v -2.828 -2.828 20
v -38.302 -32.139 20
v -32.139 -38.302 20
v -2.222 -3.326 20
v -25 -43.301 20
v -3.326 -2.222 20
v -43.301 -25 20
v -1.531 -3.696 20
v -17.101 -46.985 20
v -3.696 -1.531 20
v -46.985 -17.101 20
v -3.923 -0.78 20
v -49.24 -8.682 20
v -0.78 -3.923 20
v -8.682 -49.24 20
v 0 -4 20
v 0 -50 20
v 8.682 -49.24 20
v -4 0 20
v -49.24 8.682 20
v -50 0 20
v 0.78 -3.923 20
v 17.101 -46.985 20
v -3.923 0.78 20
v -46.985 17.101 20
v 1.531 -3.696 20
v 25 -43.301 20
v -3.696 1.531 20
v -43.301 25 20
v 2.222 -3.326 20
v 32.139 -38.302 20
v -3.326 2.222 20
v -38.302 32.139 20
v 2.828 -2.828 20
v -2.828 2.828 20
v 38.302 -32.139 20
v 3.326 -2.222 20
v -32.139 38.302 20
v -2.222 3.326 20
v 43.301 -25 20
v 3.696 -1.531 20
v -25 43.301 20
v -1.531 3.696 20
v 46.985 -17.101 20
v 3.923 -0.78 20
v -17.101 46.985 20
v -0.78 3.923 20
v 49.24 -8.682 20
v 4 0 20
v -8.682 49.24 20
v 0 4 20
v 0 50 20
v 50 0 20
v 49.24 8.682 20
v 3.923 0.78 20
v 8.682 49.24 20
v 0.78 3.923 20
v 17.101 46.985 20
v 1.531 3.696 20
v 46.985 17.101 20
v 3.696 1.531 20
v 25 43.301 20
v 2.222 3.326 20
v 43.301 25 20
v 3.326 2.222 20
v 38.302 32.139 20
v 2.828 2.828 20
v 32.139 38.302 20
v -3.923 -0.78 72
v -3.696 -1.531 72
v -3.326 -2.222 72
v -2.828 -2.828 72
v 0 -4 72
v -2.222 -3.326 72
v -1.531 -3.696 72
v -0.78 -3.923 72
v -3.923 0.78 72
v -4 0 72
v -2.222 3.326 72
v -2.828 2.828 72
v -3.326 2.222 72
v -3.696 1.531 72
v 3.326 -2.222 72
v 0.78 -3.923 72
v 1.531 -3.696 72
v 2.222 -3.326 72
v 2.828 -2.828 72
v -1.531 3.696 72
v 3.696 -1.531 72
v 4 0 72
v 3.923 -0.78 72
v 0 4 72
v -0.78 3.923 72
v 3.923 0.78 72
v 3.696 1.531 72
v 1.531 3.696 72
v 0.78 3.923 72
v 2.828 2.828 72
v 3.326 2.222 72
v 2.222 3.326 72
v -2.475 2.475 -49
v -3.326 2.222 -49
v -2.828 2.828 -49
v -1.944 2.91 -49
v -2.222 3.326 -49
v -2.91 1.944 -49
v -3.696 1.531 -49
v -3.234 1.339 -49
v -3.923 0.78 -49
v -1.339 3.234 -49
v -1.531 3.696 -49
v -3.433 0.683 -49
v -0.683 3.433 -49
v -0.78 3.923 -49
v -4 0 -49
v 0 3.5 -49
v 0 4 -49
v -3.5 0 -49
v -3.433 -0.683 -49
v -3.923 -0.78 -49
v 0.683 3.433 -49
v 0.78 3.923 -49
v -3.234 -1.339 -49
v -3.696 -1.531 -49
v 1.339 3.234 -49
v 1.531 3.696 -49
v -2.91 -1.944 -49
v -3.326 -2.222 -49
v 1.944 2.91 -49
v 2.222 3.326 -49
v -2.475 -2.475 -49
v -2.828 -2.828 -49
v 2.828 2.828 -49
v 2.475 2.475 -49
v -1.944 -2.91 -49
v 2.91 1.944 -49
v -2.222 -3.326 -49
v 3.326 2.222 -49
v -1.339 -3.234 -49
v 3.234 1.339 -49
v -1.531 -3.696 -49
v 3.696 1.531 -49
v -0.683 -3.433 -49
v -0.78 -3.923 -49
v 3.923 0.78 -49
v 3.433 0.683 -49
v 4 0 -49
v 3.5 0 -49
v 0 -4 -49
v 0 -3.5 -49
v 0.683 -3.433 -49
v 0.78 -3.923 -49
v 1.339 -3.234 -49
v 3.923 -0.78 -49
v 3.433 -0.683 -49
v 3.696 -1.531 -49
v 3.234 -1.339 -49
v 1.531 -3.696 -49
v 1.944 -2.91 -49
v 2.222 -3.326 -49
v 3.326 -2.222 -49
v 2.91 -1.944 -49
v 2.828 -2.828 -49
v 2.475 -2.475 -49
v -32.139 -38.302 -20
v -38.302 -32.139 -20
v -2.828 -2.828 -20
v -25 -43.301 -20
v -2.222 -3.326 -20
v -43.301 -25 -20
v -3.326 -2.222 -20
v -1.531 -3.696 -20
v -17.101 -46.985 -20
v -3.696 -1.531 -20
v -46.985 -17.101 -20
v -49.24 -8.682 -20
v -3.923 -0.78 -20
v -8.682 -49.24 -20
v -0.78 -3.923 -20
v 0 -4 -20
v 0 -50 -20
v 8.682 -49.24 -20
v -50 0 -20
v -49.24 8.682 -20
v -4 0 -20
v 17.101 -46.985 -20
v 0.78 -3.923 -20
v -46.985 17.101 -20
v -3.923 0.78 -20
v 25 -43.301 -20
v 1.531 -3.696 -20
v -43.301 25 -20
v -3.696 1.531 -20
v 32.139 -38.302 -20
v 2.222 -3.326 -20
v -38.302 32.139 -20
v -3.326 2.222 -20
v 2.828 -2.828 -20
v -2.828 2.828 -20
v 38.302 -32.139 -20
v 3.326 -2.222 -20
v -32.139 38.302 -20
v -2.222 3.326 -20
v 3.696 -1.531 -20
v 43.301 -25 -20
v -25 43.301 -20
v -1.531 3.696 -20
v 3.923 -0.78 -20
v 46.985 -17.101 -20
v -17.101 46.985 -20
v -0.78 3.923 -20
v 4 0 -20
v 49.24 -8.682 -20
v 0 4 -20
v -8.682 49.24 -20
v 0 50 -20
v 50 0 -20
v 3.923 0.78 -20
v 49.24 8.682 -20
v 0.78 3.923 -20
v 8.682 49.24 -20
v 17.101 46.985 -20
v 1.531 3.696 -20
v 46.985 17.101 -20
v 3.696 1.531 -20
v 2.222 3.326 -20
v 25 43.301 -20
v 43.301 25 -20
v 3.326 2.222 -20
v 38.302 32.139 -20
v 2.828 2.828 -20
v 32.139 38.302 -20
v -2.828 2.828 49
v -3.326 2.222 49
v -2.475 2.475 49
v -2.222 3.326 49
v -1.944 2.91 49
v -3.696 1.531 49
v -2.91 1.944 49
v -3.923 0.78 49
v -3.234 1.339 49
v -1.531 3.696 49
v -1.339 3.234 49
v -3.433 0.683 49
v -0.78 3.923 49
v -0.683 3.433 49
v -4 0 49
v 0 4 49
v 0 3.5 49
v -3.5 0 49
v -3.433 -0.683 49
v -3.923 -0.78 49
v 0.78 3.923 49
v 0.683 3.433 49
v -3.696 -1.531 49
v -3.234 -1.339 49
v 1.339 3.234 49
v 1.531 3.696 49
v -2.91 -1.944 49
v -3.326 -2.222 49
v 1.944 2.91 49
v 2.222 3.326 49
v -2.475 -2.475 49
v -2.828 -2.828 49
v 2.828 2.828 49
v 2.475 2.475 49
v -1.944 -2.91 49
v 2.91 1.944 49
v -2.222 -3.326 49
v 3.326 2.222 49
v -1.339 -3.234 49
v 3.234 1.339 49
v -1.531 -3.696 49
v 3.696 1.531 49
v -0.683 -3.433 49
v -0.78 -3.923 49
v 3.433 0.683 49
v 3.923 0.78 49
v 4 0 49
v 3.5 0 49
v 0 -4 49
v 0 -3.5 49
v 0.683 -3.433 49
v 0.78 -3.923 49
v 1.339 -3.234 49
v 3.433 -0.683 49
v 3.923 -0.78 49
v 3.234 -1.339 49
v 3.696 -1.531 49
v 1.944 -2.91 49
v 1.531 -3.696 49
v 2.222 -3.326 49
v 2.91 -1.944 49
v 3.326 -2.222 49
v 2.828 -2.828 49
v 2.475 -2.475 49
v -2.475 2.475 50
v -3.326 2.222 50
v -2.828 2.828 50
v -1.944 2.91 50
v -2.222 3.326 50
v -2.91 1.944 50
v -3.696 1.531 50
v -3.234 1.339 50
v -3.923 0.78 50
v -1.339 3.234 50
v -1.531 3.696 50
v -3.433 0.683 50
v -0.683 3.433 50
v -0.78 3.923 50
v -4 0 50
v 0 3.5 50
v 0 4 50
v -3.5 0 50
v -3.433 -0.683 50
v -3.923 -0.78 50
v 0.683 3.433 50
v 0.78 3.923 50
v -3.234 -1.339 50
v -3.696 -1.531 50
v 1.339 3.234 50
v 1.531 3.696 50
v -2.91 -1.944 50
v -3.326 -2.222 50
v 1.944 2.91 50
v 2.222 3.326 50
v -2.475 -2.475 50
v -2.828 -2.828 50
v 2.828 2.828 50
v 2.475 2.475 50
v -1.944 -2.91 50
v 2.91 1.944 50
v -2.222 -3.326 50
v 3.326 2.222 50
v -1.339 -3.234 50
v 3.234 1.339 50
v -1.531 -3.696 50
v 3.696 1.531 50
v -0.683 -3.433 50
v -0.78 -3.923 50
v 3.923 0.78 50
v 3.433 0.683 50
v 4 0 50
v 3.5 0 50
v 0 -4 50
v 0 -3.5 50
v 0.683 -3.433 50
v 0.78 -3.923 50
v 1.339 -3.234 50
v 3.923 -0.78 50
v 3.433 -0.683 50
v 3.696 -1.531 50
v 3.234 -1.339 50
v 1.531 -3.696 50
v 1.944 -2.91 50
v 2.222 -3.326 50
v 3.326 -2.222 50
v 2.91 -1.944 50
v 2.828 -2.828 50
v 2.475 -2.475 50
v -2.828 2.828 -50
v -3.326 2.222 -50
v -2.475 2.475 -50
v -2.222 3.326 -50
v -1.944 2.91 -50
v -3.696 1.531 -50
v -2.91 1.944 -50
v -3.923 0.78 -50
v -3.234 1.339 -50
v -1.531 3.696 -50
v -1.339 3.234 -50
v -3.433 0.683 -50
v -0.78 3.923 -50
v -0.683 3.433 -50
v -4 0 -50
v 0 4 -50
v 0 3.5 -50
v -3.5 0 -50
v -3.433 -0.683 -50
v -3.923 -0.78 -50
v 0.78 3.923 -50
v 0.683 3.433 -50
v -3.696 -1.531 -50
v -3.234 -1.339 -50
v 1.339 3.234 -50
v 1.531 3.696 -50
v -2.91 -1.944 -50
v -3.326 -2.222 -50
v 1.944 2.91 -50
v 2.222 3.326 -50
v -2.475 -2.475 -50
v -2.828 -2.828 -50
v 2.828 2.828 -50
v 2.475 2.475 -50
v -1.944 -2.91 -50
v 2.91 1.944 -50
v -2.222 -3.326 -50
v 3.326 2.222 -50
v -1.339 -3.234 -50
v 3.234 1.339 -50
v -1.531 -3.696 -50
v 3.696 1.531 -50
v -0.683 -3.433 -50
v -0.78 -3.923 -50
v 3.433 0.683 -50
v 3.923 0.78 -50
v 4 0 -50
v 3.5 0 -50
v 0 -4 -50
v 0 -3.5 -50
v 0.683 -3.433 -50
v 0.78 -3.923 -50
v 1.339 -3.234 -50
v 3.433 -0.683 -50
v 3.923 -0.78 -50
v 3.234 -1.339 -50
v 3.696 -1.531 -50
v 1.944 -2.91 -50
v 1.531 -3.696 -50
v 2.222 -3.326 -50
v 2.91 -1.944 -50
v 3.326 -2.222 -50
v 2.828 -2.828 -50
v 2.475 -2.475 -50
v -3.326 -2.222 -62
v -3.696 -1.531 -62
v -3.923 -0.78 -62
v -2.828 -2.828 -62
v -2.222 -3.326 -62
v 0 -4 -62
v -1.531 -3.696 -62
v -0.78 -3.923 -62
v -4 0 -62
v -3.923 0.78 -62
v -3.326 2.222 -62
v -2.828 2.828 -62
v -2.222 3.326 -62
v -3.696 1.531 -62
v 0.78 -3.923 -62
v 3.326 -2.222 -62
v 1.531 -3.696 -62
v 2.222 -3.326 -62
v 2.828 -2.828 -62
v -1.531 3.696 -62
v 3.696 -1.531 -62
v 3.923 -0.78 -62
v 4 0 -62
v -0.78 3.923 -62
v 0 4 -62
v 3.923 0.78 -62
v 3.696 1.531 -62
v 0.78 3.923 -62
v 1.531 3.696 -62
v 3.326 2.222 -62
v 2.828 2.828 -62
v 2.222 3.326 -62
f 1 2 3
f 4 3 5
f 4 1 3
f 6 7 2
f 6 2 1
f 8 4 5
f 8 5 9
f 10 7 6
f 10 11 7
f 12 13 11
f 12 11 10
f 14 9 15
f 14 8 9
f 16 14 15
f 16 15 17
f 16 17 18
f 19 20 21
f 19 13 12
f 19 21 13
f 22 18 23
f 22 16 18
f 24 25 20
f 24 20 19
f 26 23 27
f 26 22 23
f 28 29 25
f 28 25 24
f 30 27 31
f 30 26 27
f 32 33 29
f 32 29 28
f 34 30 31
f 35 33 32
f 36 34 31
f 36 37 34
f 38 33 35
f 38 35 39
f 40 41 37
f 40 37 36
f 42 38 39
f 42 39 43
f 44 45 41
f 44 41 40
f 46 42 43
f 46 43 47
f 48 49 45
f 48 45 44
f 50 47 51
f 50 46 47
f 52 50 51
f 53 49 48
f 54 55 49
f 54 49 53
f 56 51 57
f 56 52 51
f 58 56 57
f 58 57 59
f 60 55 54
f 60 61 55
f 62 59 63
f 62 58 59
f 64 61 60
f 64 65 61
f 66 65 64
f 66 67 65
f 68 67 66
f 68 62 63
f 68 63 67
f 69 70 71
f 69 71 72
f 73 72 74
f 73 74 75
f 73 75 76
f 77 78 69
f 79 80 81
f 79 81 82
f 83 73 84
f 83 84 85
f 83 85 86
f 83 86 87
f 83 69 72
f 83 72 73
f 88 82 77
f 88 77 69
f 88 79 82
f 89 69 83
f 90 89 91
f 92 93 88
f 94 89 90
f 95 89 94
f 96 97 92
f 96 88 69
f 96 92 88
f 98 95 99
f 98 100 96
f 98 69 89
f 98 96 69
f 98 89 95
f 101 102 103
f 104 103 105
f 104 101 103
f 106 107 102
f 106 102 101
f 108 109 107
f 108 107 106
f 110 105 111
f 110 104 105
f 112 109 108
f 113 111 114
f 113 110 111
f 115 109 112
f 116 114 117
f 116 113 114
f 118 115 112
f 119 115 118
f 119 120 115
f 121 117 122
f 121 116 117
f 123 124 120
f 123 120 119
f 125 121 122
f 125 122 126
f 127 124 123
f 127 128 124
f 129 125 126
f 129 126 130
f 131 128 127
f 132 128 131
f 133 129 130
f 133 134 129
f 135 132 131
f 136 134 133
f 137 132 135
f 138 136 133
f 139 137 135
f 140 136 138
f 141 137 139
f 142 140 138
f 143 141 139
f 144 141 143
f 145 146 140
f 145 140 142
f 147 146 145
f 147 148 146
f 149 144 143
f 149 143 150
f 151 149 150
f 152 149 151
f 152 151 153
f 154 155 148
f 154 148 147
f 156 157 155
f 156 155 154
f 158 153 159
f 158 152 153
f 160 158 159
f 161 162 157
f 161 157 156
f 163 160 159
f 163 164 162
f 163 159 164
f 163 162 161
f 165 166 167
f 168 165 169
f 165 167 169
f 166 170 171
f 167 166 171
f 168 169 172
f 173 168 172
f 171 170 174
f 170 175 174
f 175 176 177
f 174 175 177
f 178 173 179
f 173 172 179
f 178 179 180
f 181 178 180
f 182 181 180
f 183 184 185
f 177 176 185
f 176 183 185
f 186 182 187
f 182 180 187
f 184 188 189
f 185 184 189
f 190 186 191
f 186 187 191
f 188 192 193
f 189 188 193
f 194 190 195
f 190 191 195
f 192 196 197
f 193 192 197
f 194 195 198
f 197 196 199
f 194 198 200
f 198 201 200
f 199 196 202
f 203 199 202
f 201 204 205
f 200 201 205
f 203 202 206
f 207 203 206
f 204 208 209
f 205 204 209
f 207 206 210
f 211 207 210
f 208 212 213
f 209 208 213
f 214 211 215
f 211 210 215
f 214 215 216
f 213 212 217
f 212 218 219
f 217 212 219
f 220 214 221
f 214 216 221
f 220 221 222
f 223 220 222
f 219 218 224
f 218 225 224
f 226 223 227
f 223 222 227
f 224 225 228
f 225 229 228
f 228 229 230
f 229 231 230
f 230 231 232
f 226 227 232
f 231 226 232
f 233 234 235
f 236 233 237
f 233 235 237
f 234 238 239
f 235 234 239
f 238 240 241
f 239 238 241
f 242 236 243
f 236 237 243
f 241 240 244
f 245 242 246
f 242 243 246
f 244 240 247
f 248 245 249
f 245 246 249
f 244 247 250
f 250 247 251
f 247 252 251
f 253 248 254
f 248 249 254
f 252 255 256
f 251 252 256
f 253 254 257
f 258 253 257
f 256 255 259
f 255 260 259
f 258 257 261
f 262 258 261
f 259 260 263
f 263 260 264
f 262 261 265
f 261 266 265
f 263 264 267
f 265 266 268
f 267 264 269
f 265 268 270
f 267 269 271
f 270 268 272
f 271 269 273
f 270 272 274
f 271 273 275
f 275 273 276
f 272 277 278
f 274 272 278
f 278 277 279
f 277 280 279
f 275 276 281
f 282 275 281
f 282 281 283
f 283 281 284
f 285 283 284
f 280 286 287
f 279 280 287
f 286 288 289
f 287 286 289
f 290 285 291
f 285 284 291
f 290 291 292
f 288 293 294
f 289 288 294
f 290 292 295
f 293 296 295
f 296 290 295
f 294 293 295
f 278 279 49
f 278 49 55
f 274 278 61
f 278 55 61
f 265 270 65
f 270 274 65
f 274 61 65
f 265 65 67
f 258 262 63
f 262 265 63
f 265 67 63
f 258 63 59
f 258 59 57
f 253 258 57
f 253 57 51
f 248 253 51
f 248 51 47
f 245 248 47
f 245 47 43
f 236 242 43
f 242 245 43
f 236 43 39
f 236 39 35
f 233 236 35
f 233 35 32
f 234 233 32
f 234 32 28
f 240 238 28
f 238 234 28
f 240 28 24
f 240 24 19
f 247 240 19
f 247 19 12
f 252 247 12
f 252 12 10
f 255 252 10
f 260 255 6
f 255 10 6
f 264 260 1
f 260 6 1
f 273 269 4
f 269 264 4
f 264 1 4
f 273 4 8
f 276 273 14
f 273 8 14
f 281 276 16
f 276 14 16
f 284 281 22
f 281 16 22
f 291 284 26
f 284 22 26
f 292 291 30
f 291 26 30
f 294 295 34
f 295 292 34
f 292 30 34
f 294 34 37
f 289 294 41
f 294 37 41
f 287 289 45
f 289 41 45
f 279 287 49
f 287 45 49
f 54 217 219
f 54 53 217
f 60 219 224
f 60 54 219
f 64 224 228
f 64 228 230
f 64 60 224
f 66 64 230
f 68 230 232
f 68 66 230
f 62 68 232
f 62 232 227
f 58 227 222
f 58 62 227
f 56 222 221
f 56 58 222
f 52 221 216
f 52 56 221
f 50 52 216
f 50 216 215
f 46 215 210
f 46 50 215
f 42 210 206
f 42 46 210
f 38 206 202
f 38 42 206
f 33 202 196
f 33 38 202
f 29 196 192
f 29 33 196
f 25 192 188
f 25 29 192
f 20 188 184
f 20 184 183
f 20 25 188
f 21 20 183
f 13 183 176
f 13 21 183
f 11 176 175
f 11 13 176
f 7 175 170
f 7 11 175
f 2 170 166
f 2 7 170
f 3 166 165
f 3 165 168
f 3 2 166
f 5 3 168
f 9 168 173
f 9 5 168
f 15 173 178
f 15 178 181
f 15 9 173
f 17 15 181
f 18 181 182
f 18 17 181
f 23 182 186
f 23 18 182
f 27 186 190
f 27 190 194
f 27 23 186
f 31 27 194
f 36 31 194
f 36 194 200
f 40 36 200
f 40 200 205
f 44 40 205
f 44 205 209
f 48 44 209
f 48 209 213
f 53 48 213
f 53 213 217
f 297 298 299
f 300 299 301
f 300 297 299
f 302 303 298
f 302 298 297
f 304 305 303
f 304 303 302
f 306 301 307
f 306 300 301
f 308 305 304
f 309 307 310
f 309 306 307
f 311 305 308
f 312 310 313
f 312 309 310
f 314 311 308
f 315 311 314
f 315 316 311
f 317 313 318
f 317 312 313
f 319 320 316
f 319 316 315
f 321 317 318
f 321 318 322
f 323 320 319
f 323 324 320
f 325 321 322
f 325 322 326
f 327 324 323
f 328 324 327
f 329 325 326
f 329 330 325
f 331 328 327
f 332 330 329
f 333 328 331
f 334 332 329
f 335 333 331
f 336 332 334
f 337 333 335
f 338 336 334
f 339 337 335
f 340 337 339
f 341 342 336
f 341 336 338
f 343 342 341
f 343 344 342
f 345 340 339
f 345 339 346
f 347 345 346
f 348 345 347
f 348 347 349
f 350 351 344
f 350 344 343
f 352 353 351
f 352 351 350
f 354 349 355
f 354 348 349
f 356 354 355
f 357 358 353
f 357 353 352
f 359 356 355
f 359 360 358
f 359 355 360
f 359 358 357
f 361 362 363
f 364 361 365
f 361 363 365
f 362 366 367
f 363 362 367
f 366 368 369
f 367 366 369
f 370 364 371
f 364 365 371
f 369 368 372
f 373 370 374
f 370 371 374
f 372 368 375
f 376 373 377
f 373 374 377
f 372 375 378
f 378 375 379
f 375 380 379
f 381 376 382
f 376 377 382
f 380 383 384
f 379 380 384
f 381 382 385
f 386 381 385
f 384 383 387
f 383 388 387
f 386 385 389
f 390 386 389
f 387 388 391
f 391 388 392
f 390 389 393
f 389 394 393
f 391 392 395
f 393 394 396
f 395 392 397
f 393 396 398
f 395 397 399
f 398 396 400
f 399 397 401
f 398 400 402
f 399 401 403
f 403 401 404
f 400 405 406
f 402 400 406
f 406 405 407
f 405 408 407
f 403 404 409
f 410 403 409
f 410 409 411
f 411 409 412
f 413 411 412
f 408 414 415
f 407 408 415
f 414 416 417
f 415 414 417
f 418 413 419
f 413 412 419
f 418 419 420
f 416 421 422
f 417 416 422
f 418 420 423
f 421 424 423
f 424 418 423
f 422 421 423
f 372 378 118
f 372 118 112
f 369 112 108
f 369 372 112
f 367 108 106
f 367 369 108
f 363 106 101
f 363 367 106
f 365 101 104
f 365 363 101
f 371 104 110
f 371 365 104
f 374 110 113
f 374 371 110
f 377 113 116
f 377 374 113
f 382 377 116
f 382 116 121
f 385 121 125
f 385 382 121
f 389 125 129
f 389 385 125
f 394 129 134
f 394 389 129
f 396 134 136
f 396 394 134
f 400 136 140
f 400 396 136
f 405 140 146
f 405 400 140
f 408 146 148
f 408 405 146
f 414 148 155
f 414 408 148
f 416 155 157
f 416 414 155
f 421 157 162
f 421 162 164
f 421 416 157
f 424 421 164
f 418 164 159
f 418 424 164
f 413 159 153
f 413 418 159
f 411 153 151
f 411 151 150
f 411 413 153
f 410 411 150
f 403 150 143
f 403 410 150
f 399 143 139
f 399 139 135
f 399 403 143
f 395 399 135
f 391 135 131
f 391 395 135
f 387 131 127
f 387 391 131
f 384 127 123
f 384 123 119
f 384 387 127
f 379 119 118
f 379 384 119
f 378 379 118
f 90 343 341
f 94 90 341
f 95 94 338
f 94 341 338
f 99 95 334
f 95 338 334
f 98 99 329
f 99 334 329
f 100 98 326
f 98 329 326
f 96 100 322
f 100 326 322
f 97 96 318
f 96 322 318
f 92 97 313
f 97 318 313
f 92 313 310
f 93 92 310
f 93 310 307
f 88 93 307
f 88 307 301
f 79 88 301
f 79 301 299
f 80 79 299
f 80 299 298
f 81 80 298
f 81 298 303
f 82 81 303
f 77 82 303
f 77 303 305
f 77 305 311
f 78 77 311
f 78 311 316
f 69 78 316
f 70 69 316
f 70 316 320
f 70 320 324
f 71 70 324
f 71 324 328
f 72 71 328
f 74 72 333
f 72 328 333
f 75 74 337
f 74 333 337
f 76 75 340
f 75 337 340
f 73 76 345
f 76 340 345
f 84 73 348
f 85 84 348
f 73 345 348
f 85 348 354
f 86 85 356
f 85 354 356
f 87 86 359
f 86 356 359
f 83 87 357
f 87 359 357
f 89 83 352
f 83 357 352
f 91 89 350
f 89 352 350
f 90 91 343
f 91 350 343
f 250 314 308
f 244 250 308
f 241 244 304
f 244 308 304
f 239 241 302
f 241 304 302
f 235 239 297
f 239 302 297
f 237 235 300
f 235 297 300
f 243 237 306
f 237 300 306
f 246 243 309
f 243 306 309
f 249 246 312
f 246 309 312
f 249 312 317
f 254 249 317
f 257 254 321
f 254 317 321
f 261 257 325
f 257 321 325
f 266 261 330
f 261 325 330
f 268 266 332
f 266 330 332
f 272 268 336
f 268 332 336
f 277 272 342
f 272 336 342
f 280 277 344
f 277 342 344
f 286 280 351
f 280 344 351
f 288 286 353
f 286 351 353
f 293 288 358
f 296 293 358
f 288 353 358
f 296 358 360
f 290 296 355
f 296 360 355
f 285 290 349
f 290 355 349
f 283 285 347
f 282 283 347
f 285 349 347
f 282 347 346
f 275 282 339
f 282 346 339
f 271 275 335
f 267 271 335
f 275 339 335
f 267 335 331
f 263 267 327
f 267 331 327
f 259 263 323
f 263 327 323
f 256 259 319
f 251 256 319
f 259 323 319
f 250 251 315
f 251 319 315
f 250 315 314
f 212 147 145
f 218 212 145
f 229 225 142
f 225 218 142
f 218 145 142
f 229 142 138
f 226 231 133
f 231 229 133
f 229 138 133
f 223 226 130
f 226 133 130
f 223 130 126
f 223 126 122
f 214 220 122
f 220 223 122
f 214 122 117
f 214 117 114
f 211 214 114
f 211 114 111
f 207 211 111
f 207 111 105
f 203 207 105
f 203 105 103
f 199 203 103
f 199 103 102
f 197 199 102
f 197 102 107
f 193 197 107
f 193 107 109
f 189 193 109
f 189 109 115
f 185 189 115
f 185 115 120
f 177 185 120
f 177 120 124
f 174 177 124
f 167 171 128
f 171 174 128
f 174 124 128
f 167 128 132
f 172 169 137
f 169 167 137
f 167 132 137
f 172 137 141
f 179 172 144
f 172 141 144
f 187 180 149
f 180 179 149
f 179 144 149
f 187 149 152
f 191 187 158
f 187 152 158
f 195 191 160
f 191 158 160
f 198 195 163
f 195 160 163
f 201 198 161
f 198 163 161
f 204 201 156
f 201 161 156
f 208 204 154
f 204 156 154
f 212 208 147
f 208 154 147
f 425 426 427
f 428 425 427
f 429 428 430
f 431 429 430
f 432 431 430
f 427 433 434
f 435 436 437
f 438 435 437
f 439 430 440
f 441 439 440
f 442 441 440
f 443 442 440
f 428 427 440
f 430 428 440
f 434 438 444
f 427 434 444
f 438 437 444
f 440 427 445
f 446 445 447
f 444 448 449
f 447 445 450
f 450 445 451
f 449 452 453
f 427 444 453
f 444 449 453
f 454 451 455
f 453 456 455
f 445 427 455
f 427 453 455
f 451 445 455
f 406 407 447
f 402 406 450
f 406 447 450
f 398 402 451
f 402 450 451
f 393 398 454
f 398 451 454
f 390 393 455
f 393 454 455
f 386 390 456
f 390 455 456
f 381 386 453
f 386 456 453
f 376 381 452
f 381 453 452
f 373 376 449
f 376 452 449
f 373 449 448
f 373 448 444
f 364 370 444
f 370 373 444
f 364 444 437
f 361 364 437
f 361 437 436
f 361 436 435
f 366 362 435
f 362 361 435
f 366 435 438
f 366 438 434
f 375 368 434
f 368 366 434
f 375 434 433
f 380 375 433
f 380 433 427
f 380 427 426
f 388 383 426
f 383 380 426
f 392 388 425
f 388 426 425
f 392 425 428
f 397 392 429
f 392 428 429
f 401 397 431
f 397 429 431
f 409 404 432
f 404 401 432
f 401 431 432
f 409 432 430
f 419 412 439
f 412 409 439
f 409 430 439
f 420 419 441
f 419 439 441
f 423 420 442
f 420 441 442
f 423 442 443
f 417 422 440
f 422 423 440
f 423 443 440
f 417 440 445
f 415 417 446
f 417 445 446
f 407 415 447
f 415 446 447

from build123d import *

# Parameters (mm, degrees)
SKETCH1_R                = 50
BOSS_EXTRUDE1_DEPTH      = 20
BOSS_EXTRUDE2_DEPTH      = 52
BOSS_EXTRUDE2_DEPTH_BACK = 82
SKETCH2_R                = 4
SKETCH3_R                = 4
SKETCH3_R_2              = 3.5
CUT_EXTRUDE1_DEPTH       = 1


with BuildPart() as part:
    # Sketch1 → Boss-Extrude1 (new, symmetric)
    with BuildSketch(Plane.XY):
        Circle(SKETCH1_R)
    extrude(amount=BOSS_EXTRUDE1_DEPTH, both=True)

    # Sketch2 → Boss-Extrude2 (add, two sides: drawn at the far end of the back side and taken through both)
    with BuildSketch(Plane.XY.offset(20).offset(-BOSS_EXTRUDE2_DEPTH_BACK)):
        Circle(SKETCH2_R)
    extrude(amount=BOSS_EXTRUDE2_DEPTH + BOSS_EXTRUDE2_DEPTH_BACK)

    # Sketch3 → Cut-Extrude1 (cut)
    with BuildSketch(Plane(origin=(0, 0, -50), x_dir=(-1, 0, 0), z_dir=(0, 0, -1))):
        with Locations(Location((0, 0, 0), (0, 0, 180))):
            Circle(SKETCH3_R)
        Circle(SKETCH3_R_2, mode=Mode.SUBTRACT)
    cut_extrude1 = extrude(amount=-CUT_EXTRUDE1_DEPTH, mode=Mode.SUBTRACT)

    # Mirror1: Cut-Extrude1 across plane
    add(cut_extrude1.mirror(Plane.XY), mode=Mode.SUBTRACT)


solid = part.part
